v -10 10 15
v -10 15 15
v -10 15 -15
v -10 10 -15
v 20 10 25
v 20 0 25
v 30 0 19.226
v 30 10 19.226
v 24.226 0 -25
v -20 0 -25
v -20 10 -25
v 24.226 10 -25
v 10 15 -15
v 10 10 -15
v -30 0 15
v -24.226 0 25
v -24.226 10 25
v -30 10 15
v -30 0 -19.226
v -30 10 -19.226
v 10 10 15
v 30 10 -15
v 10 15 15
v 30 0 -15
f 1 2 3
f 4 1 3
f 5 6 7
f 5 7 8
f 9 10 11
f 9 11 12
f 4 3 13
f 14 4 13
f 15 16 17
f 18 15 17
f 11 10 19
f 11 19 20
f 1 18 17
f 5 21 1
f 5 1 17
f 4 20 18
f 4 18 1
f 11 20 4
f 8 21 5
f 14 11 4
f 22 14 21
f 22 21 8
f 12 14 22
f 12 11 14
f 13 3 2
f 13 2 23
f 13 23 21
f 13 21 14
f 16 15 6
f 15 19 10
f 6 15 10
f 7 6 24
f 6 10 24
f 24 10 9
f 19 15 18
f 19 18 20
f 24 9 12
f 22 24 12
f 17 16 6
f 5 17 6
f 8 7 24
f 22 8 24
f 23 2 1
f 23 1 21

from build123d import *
from OCP.BRepFilletAPI import BRepFilletAPI_MakeChamfer

# Parameters (mm, degrees)
SKETCH1_W           = 60
SKETCH1_H           = 50
BOSS_EXTRUDE1_DEPTH = 15
CHAMFER1_SIZE       = 10
CHAMFER1_SIZE2      = 5.773502692
SKETCH2_W           = 20
SKETCH2_H           = 30
CUT_EXTRUDE1_DEPTH  = 5


with BuildPart() as part:
    # Sketch1 → Boss-Extrude1 (new body)
    with BuildSketch(Plane(origin=(0, 0, 0), x_dir=(1, 0, 0), z_dir=(0, 1, 0))):
        Rectangle(SKETCH1_W, SKETCH1_H)
    extrude(amount=BOSS_EXTRUDE1_DEPTH)

    # Chamfer1: one chamfer whose edges measure the first distance from different faces: ONE call of the kernel's chamfer builder (chamfer() names one face for all edges)
    chamfer1_edges_1 = [part.edges().sort_by_distance(p)[0] for p in [
        (30, 7.5, 25),
    ]]
    chamfer1_side_1 = [part.faces().sort_by_distance(p)[0] for p in [
        (0, 7.5, 25),
    ]]
    chamfer1_edges_2 = [part.edges().sort_by_distance(p)[0] for p in [
        (-30, 7.5, 25),
    ]]
    chamfer1_side_2 = [part.faces().sort_by_distance(p)[0] for p in [
        (-30, 7.5, 0),
    ]]
    chamfer1_edges_3 = [part.edges().sort_by_distance(p)[0] for p in [
        (-30, 7.5, -25),
    ]]
    chamfer1_side_3 = [part.faces().sort_by_distance(p)[0] for p in [
        (0, 7.5, -25),
    ]]
    chamfer1_edges_4 = [part.edges().sort_by_distance(p)[0] for p in [
        (30, 7.5, -25),
    ]]
    chamfer1_side_4 = [part.faces().sort_by_distance(p)[0] for p in [
        (30, 7.5, 0),
    ]]
    chamfer1 = BRepFilletAPI_MakeChamfer(part.part.solid().wrapped)
    for e in chamfer1_edges_1:
        chamfer1.Add(CHAMFER1_SIZE, CHAMFER1_SIZE2, e.wrapped, chamfer1_side_1[0].wrapped)  # the first distance lies on this face
    for e in chamfer1_edges_2:
        chamfer1.Add(CHAMFER1_SIZE, CHAMFER1_SIZE2, e.wrapped, chamfer1_side_2[0].wrapped)  # the first distance lies on this face
    for e in chamfer1_edges_3:
        chamfer1.Add(CHAMFER1_SIZE, CHAMFER1_SIZE2, e.wrapped, chamfer1_side_3[0].wrapped)  # the first distance lies on this face
    for e in chamfer1_edges_4:
        chamfer1.Add(CHAMFER1_SIZE, CHAMFER1_SIZE2, e.wrapped, chamfer1_side_4[0].wrapped)  # the first distance lies on this face
    add(Compound.cast(chamfer1.Shape()), mode=Mode.REPLACE)

    # Sketch2 → Cut-Extrude1 (cut)
    with BuildSketch(Plane(origin=(0, 15, 0), x_dir=(1, 0, 0), z_dir=(0, 1, 0))):
        Polygon((30, 15), (24.226497308, 25), (-20, 25), (-30, 19.226497308), (-30, -15), (-24.226497308, -25), (20, -25), (30, -19.226497308), align=None)
        Rectangle(SKETCH2_W, SKETCH2_H, mode=Mode.SUBTRACT)
    extrude(amount=-CUT_EXTRUDE1_DEPTH, mode=Mode.SUBTRACT)


solid = part.part
